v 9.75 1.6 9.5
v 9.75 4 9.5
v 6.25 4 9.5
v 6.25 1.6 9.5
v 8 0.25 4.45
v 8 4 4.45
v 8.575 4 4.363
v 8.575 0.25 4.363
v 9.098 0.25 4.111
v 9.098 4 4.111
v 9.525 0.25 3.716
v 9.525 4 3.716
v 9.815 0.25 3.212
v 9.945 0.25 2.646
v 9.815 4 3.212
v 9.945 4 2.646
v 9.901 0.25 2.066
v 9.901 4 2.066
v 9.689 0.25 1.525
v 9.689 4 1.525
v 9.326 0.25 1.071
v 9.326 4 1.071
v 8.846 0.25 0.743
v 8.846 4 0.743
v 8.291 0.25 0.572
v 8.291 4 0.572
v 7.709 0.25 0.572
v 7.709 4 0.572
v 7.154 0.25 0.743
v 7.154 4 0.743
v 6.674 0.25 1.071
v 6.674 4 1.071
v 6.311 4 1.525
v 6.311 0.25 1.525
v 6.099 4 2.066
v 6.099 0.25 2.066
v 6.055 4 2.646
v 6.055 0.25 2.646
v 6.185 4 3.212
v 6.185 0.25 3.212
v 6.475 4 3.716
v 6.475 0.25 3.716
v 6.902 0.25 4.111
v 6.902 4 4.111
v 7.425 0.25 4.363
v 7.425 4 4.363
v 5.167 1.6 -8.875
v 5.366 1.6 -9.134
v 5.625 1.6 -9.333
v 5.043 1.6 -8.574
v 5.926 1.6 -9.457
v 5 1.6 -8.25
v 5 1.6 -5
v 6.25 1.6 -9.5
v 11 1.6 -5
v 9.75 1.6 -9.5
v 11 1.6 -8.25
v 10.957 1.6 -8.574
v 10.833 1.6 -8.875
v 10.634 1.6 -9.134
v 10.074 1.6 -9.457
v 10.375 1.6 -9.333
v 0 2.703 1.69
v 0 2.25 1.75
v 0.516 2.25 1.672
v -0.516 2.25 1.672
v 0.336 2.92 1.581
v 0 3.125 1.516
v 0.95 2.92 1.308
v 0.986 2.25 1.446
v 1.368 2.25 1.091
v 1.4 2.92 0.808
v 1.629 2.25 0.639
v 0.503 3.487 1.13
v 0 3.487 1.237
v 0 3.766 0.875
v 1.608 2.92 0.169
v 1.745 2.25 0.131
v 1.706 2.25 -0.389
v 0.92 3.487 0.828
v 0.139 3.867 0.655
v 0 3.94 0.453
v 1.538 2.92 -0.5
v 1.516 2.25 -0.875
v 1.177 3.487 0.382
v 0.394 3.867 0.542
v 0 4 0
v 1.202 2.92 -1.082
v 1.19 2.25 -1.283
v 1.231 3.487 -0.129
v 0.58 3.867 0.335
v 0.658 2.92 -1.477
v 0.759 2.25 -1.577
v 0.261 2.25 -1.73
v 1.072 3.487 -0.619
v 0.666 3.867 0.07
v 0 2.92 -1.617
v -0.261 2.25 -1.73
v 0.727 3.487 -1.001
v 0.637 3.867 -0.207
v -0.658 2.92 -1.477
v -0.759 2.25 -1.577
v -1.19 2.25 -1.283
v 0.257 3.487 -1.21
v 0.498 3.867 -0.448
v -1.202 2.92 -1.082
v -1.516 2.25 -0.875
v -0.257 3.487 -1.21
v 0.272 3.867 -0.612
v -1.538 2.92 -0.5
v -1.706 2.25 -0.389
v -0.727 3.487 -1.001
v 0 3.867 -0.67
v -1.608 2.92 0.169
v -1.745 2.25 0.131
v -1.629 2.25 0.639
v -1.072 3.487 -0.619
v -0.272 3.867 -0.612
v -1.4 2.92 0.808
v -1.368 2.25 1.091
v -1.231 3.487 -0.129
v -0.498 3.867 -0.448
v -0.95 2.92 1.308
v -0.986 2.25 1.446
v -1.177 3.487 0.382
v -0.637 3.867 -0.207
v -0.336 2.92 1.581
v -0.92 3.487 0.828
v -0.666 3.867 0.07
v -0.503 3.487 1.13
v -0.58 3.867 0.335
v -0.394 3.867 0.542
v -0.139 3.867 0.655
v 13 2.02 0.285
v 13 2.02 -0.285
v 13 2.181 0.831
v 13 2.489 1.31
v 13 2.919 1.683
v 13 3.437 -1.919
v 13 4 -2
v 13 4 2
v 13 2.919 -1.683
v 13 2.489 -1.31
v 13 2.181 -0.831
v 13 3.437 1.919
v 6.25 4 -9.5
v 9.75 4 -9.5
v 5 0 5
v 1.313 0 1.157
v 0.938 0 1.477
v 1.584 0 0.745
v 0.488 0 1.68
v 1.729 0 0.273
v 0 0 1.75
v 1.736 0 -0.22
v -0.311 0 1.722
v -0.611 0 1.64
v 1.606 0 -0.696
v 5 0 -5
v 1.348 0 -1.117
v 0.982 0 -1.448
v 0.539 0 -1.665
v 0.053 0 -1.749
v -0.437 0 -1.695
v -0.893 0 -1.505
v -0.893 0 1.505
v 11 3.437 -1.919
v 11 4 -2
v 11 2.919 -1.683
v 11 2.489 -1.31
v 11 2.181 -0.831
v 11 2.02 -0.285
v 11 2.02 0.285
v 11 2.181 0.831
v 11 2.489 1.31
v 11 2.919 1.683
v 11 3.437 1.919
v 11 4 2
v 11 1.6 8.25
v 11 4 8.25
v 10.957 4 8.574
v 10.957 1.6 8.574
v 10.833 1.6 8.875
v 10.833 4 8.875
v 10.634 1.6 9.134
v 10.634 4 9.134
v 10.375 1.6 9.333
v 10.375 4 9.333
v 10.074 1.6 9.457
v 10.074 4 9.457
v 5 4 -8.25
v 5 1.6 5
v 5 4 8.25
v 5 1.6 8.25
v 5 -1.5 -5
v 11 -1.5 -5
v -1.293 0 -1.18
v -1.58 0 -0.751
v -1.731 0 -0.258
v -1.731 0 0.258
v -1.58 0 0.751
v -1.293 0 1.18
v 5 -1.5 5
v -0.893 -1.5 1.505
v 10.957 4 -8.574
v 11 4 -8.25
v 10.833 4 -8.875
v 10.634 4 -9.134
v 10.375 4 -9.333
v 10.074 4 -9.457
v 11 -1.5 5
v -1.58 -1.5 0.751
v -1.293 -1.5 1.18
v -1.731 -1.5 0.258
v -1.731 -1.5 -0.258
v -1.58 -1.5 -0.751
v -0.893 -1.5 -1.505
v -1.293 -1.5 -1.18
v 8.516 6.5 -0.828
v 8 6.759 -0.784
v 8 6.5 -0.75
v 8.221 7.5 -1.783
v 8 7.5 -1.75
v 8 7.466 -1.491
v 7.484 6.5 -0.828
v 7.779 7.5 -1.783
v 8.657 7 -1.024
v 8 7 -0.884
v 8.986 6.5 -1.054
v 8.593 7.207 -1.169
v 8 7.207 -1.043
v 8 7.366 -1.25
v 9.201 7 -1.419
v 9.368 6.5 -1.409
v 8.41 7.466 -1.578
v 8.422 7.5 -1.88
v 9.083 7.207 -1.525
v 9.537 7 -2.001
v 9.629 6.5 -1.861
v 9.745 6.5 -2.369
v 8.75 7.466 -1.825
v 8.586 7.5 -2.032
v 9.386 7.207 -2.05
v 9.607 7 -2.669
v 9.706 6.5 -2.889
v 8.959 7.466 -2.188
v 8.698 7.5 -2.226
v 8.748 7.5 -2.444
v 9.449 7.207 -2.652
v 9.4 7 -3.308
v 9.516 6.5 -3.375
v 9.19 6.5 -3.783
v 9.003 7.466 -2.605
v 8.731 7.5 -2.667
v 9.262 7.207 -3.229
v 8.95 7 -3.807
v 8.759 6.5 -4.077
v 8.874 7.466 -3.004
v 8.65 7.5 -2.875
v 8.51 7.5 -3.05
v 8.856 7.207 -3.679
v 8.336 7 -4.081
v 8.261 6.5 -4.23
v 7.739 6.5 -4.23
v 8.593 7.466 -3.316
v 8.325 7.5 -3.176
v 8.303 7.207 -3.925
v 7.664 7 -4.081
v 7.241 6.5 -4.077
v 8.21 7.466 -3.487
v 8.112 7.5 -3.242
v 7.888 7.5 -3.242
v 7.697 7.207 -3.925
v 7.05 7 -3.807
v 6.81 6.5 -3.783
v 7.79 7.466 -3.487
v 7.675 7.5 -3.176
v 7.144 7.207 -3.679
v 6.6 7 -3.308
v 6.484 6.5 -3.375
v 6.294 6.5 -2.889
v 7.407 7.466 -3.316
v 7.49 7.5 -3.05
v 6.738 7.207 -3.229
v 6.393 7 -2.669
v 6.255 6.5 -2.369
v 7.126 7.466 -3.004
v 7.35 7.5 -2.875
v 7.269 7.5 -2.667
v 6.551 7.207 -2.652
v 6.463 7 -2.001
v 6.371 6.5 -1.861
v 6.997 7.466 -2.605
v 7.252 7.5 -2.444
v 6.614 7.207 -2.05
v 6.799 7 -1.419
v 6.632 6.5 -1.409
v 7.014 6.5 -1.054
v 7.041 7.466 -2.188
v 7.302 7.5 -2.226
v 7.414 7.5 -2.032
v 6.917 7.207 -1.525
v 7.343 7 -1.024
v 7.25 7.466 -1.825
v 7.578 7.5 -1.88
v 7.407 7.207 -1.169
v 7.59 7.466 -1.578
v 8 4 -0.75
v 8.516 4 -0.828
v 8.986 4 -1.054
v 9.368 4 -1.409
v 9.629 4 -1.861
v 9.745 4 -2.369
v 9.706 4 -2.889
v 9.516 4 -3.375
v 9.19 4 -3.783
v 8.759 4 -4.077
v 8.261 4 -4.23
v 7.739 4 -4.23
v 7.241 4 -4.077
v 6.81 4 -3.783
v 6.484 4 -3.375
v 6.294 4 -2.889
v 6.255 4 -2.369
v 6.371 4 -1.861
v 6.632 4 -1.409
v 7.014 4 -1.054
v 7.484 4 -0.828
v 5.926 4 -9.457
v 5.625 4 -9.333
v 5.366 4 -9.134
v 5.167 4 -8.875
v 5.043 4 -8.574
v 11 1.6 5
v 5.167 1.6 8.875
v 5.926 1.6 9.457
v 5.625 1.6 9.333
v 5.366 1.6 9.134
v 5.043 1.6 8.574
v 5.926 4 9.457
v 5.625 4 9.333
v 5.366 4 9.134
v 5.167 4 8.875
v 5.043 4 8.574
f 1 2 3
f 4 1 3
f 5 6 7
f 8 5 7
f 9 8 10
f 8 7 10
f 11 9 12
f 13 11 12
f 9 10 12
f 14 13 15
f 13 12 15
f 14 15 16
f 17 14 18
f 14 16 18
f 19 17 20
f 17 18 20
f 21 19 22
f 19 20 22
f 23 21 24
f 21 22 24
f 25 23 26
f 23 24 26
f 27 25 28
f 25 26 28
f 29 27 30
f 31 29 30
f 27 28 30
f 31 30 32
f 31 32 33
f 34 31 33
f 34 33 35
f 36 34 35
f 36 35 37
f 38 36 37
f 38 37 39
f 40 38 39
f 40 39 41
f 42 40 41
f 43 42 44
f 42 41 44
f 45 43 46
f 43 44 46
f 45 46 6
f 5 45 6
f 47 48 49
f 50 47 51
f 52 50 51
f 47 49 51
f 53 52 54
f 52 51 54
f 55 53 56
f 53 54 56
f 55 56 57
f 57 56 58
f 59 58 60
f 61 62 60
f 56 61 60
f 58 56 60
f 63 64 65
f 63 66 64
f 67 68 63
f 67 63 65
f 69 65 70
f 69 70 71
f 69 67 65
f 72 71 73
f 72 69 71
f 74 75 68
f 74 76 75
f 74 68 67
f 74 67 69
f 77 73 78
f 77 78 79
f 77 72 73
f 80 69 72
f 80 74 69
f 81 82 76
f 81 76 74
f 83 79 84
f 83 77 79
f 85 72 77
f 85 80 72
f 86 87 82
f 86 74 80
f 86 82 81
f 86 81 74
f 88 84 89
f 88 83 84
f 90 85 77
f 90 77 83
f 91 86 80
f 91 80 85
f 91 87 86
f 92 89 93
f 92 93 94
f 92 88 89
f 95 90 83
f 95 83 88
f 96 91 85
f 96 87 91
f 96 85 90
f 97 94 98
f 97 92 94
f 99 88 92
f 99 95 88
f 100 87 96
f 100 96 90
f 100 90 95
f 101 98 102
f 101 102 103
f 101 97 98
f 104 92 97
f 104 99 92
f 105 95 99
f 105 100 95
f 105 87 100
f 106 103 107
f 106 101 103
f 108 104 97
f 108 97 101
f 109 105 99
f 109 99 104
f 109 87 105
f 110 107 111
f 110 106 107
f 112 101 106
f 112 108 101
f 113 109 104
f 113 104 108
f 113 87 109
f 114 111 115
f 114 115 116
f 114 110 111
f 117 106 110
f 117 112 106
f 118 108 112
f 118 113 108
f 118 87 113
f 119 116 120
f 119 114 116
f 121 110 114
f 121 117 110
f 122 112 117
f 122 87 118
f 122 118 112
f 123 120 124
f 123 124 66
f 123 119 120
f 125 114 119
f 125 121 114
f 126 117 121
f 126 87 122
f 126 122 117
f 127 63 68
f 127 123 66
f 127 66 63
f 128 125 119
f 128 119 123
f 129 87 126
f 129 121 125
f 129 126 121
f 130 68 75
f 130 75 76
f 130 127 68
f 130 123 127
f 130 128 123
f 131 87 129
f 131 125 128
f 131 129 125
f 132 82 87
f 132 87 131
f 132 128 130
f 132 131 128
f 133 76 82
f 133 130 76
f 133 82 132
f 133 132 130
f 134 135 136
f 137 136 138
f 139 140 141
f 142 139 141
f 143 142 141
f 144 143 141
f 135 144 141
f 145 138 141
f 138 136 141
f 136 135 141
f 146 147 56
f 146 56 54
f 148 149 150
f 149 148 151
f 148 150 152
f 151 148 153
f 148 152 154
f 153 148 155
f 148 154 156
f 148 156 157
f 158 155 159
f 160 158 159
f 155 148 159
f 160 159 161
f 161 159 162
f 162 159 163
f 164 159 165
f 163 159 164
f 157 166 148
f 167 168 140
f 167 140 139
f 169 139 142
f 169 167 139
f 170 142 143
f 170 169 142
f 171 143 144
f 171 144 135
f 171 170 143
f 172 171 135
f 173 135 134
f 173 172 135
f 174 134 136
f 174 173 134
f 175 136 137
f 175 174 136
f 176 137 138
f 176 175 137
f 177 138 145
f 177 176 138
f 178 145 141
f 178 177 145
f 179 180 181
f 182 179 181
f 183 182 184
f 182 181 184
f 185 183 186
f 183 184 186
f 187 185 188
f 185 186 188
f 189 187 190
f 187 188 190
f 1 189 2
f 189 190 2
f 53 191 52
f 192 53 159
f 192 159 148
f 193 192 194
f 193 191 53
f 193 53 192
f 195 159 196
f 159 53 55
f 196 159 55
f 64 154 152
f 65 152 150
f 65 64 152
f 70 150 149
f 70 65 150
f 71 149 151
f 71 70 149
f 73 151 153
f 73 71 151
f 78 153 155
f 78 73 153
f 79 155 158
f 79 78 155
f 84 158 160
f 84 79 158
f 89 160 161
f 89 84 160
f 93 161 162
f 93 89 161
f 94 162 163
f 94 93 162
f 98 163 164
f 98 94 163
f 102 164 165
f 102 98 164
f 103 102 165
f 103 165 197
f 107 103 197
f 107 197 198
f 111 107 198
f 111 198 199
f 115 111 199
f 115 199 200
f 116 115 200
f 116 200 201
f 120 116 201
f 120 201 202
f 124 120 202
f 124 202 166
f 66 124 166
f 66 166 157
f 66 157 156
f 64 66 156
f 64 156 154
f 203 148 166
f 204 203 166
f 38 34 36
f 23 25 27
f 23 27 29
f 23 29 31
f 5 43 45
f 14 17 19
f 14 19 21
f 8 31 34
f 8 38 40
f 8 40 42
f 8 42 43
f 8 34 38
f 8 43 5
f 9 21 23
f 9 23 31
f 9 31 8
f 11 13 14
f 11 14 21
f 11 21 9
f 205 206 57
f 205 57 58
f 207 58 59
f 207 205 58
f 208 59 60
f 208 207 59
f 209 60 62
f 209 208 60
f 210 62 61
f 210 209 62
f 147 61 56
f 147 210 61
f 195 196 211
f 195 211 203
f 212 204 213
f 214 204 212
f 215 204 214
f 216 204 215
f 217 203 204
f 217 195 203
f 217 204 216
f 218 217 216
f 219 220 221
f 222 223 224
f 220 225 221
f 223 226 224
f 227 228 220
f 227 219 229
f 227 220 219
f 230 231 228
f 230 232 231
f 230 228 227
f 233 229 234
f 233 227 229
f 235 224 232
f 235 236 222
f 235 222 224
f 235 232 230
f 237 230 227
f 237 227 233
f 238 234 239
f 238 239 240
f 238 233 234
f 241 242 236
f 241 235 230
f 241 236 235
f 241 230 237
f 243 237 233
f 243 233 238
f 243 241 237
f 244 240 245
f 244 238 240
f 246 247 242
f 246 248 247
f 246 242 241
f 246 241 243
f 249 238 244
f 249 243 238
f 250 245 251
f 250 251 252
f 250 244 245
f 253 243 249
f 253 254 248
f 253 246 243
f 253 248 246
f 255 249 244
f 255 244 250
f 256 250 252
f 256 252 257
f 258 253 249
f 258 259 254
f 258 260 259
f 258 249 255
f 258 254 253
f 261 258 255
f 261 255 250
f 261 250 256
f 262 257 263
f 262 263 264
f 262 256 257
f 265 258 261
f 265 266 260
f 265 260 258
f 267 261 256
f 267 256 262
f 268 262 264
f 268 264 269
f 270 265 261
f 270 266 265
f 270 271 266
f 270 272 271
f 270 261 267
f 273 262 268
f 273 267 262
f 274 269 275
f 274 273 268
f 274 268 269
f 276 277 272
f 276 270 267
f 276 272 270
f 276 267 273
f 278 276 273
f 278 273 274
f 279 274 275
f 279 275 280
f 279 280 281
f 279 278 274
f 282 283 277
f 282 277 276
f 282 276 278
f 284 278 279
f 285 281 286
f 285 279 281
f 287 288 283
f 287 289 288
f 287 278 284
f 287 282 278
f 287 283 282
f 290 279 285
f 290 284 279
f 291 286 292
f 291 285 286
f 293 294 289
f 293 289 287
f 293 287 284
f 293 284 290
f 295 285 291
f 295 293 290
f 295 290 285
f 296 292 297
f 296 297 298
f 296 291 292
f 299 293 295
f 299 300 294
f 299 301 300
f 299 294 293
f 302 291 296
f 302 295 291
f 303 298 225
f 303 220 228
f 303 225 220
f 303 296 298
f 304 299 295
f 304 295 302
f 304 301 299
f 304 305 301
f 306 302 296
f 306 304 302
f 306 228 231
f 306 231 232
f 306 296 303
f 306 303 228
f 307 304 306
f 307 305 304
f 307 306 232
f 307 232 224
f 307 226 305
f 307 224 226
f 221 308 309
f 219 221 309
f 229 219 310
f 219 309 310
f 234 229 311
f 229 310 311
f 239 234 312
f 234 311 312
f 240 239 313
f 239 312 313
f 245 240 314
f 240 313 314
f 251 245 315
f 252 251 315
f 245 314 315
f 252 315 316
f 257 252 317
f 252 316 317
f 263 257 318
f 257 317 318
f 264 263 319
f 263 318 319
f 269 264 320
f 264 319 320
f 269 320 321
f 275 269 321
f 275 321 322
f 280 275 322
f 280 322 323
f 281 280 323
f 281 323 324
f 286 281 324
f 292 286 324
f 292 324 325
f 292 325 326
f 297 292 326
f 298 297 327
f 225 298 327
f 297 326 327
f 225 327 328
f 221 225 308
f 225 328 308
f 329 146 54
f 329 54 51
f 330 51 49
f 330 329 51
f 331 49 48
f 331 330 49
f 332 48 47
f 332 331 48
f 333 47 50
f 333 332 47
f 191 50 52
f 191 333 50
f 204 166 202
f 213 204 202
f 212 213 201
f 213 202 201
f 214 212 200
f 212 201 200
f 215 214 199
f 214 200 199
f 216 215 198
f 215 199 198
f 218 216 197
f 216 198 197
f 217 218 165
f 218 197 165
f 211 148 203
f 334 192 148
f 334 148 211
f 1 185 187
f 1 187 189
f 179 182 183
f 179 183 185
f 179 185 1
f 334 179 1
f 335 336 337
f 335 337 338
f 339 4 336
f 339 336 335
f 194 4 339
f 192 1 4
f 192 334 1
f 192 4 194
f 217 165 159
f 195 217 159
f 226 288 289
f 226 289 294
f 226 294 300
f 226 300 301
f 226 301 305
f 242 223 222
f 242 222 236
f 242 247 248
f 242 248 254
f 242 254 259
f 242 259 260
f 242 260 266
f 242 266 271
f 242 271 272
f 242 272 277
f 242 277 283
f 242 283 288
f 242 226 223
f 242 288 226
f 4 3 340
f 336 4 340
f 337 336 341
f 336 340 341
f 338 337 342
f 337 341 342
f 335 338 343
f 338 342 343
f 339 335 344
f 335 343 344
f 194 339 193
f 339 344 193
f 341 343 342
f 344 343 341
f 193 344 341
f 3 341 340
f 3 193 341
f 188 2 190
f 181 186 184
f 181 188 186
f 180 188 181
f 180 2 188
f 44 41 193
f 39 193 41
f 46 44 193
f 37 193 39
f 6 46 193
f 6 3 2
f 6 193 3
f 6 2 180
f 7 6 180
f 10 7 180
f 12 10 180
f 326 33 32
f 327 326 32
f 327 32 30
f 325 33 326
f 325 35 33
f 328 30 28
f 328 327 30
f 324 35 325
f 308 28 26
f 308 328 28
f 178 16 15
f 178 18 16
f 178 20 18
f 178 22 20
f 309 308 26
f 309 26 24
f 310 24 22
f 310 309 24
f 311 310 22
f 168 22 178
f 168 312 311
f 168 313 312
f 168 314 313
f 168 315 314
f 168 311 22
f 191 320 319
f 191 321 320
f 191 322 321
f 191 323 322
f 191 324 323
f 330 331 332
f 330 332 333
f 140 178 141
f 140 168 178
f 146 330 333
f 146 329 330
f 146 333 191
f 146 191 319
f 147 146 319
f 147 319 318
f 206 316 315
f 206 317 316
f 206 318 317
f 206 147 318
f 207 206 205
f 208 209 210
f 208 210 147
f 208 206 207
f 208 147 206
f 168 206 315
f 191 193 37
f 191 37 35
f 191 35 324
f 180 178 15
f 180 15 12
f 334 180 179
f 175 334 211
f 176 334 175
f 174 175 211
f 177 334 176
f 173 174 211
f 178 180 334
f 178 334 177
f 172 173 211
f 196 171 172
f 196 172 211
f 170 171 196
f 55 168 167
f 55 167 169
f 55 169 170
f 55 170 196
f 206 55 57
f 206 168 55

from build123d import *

# Parameters (mm, degrees)
BOSS_EXTRUDE1_DEPTH = 1.5
BOSS_EXTRUDE2_START = 4
SKETCH2_R           = 1.75
SKETCH2_W           = 6
SKETCH2_H           = 10
BOSS_EXTRUDE2_DEPTH = 4
BOSS_EXTRUDE3_DEPTH = 2.4
FILLET1_R           = 1.75
SKETCH4_R           = 1.75
BOSS_EXTRUDE4_DEPTH = 3.5
FILLET2_R           = 1
SKETCH5_R           = 1.95
CUT_EXTRUDE1_DEPTH  = 3.75
BOSS_EXTRUDE5_DEPTH = 2


with BuildPart() as part:
    # Sketch1 → Boss-Extrude1 (new body)
    with BuildSketch(Plane(origin=(0, 0, 0), x_dir=(1, 0, 0), z_dir=(0, 1, 0))):
        with BuildLine():
            Line((5, 5), (11, 5))
            Line((11, 5), (11, -5))
            Line((11, -5), (5, -5))
            Line((5, -5), (-0.892691591, -1.505191591))
            ThreePointArc((-0.892691591, -1.505191591), (-1.75, 0), (-0.892691591, 1.505191591))
            Line((-0.892691591, 1.505191591), (5, 5))
        make_face()
    extrude(amount=-BOSS_EXTRUDE1_DEPTH)

    # Sketch2 → Boss-Extrude2 (add)
    with BuildSketch(Plane(origin=(0, 0, 0), x_dir=(1, 0, 0), z_dir=(0, 1, 0)).offset(BOSS_EXTRUDE2_START)):
        with Locations(Location((0, 0, 0), (0, 0, 270))):
            Circle(SKETCH2_R)
        with Locations((8, 0)):
            Rectangle(SKETCH2_W, SKETCH2_H)
    extrude(amount=-BOSS_EXTRUDE2_DEPTH)

    # Sketch3 → Boss-Extrude3 (add)
    with BuildSketch(Plane(origin=(0, 4, 0), x_dir=(1, 0, 0), z_dir=(0, 1, 0))):
        with BuildLine():
            Line((5, 5), (11, 5))
            Line((11, 5), (11, 8.25))
            ThreePointArc((11, 8.25), (10.633883476, 9.133883476), (9.75, 9.5))
            Line((9.75, 9.5), (6.25, 9.5))
            ThreePointArc((6.25, 9.5), (5.366116524, 9.133883476), (5, 8.25))
            Line((5, 8.25), (5, 5))
        make_face()
        with BuildLine():
            Line((5, -5), (11, -5))
            Line((11, -5), (11, -8.25))
            ThreePointArc((11, -8.25), (10.633883476, -9.133883476), (9.75, -9.5))
            Line((9.75, -9.5), (6.25, -9.5))
            ThreePointArc((6.25, -9.5), (5.366116524, -9.133883476), (5, -8.25))
            Line((5, -8.25), (5, -5))
        make_face()
    extrude(amount=-BOSS_EXTRUDE3_DEPTH)

    # Fillet1
    fillet1_edges = [part.edges().sort_by_distance(p)[0] for p in [
        (0, 4, -1.75),
    ]]
    fillet(fillet1_edges, radius=FILLET1_R)

    # Sketch4 → Boss-Extrude4 (add)
    with BuildSketch(Plane(origin=(0, 4, 0), x_dir=(1, 0, 0), z_dir=(0, 1, 0))):
        with Locations(Location((8, 2.5, 0), (0, 0, 270))):
            Circle(SKETCH4_R)
    extrude(amount=BOSS_EXTRUDE4_DEPTH)

    # Fillet2
    fillet2_edges = [part.edges().sort_by_distance(p)[0] for p in [
        (8, 7.5, -4.25),
    ]]
    fillet(fillet2_edges, radius=FILLET2_R)

    # Sketch5 → Cut-Extrude1 (cut)
    with BuildSketch(Plane(origin=(0, 4, 0), x_dir=(1, 0, 0), z_dir=(0, 1, 0))):
        with Locations(Location((8, -2.5, 0), (0, 0, 270))):
            Circle(SKETCH5_R)
    extrude(amount=-CUT_EXTRUDE1_DEPTH, mode=Mode.SUBTRACT)

    # Sketch6 → Boss-Extrude5 (add)
    with BuildSketch(Plane(origin=(11, 0, 0), x_dir=(0, 0, -1), z_dir=(1, 0, 0))):
        with BuildLine():
            Line((-2, 4), (2, 4))
            ThreePointArc((2, 4), (0, 2), (-2, 4))
        make_face()
    extrude(amount=BOSS_EXTRUDE5_DEPTH)


solid = part.part
